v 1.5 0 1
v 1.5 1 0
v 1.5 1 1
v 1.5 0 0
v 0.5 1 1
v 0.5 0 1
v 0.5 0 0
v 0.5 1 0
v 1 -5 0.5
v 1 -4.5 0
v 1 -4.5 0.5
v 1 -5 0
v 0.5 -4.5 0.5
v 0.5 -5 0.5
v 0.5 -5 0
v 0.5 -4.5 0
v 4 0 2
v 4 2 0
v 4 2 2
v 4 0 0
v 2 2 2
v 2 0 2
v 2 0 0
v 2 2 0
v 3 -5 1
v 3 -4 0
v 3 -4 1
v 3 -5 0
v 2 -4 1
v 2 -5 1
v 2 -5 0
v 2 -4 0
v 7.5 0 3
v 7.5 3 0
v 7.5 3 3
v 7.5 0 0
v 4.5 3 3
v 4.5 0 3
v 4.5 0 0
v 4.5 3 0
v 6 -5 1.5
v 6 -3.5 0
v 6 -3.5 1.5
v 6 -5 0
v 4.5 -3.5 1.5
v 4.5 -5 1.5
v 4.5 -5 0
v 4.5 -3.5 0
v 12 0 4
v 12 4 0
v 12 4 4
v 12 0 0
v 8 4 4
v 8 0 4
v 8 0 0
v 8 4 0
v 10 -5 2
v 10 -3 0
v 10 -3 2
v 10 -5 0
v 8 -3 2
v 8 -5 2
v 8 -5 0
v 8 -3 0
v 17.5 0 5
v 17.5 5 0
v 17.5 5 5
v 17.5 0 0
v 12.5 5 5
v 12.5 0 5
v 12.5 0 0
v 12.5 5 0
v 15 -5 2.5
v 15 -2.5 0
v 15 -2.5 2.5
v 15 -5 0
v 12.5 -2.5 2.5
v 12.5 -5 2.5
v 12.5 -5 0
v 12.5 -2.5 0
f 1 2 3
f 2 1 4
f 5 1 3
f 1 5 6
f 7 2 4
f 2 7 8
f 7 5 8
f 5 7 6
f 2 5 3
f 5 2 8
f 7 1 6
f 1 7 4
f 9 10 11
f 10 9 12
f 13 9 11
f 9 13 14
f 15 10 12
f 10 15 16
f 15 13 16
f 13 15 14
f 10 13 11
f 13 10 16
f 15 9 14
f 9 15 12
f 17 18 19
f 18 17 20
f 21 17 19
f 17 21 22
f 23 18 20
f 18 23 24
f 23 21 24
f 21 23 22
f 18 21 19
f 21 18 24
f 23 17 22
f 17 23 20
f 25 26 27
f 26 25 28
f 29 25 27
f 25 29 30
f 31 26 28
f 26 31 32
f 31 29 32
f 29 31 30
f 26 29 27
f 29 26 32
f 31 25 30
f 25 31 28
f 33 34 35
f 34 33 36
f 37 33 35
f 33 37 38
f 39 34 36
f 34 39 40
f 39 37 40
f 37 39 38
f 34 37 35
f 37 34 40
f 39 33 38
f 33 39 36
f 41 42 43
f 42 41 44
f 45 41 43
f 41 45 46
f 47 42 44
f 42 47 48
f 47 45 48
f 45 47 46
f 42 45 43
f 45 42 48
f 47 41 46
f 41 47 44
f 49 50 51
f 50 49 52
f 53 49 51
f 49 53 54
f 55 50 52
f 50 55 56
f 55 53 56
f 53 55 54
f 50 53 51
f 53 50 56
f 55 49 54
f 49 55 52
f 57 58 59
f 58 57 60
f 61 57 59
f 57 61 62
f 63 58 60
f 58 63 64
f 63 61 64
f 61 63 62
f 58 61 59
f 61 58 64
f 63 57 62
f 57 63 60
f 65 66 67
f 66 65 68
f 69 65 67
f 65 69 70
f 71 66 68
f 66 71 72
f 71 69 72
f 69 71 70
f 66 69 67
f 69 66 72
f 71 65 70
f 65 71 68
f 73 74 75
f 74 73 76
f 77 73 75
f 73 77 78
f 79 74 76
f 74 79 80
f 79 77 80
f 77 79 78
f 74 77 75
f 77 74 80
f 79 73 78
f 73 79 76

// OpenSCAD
// Volume: 253.125, SurfaceArea: 412.5
for(i=[0:5]) {
  translate([i*i/2,0,0]) {
    cube(i);
    translate([0,-5,0]) {
      f=1.0*i/2;
      cube(f);
    }
  }
}
